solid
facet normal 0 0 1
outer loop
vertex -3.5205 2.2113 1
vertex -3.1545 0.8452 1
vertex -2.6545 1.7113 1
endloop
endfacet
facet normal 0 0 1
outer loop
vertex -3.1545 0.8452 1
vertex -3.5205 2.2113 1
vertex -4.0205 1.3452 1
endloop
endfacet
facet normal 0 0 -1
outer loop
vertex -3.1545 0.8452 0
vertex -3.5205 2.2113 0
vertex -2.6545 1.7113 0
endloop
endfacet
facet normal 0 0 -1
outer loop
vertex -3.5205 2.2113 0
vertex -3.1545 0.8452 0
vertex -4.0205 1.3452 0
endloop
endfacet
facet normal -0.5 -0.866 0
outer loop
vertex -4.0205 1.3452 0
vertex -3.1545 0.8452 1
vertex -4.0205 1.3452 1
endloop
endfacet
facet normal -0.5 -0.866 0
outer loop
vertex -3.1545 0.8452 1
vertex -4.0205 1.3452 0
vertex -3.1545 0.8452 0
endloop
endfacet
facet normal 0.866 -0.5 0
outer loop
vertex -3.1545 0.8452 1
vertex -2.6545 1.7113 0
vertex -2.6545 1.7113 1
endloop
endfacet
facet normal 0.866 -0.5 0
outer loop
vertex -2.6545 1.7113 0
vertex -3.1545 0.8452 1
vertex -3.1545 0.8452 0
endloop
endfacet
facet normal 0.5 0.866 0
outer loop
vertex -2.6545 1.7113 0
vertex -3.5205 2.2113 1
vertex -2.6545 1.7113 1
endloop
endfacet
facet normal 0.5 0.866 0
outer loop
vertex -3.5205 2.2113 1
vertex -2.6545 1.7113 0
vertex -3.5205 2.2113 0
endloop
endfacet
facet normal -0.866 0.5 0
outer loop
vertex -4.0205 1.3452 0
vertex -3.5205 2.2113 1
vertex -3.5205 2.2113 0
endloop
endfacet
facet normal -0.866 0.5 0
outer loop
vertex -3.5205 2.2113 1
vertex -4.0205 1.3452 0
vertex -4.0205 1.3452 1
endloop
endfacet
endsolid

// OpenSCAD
// A module that calls itself `steps` times, each step moved and turned.
// The comparison sets steps to 100 and to 150.
//
// SPDX-License-Identifier: GPL-3.0-or-later

steps = 150;

module step(n) {
    if (n > 0)
        translate([1, 0, 0]) rotate([0, 0, 7]) step(n - 1);
    else
        cube(1);
}

step(steps);
